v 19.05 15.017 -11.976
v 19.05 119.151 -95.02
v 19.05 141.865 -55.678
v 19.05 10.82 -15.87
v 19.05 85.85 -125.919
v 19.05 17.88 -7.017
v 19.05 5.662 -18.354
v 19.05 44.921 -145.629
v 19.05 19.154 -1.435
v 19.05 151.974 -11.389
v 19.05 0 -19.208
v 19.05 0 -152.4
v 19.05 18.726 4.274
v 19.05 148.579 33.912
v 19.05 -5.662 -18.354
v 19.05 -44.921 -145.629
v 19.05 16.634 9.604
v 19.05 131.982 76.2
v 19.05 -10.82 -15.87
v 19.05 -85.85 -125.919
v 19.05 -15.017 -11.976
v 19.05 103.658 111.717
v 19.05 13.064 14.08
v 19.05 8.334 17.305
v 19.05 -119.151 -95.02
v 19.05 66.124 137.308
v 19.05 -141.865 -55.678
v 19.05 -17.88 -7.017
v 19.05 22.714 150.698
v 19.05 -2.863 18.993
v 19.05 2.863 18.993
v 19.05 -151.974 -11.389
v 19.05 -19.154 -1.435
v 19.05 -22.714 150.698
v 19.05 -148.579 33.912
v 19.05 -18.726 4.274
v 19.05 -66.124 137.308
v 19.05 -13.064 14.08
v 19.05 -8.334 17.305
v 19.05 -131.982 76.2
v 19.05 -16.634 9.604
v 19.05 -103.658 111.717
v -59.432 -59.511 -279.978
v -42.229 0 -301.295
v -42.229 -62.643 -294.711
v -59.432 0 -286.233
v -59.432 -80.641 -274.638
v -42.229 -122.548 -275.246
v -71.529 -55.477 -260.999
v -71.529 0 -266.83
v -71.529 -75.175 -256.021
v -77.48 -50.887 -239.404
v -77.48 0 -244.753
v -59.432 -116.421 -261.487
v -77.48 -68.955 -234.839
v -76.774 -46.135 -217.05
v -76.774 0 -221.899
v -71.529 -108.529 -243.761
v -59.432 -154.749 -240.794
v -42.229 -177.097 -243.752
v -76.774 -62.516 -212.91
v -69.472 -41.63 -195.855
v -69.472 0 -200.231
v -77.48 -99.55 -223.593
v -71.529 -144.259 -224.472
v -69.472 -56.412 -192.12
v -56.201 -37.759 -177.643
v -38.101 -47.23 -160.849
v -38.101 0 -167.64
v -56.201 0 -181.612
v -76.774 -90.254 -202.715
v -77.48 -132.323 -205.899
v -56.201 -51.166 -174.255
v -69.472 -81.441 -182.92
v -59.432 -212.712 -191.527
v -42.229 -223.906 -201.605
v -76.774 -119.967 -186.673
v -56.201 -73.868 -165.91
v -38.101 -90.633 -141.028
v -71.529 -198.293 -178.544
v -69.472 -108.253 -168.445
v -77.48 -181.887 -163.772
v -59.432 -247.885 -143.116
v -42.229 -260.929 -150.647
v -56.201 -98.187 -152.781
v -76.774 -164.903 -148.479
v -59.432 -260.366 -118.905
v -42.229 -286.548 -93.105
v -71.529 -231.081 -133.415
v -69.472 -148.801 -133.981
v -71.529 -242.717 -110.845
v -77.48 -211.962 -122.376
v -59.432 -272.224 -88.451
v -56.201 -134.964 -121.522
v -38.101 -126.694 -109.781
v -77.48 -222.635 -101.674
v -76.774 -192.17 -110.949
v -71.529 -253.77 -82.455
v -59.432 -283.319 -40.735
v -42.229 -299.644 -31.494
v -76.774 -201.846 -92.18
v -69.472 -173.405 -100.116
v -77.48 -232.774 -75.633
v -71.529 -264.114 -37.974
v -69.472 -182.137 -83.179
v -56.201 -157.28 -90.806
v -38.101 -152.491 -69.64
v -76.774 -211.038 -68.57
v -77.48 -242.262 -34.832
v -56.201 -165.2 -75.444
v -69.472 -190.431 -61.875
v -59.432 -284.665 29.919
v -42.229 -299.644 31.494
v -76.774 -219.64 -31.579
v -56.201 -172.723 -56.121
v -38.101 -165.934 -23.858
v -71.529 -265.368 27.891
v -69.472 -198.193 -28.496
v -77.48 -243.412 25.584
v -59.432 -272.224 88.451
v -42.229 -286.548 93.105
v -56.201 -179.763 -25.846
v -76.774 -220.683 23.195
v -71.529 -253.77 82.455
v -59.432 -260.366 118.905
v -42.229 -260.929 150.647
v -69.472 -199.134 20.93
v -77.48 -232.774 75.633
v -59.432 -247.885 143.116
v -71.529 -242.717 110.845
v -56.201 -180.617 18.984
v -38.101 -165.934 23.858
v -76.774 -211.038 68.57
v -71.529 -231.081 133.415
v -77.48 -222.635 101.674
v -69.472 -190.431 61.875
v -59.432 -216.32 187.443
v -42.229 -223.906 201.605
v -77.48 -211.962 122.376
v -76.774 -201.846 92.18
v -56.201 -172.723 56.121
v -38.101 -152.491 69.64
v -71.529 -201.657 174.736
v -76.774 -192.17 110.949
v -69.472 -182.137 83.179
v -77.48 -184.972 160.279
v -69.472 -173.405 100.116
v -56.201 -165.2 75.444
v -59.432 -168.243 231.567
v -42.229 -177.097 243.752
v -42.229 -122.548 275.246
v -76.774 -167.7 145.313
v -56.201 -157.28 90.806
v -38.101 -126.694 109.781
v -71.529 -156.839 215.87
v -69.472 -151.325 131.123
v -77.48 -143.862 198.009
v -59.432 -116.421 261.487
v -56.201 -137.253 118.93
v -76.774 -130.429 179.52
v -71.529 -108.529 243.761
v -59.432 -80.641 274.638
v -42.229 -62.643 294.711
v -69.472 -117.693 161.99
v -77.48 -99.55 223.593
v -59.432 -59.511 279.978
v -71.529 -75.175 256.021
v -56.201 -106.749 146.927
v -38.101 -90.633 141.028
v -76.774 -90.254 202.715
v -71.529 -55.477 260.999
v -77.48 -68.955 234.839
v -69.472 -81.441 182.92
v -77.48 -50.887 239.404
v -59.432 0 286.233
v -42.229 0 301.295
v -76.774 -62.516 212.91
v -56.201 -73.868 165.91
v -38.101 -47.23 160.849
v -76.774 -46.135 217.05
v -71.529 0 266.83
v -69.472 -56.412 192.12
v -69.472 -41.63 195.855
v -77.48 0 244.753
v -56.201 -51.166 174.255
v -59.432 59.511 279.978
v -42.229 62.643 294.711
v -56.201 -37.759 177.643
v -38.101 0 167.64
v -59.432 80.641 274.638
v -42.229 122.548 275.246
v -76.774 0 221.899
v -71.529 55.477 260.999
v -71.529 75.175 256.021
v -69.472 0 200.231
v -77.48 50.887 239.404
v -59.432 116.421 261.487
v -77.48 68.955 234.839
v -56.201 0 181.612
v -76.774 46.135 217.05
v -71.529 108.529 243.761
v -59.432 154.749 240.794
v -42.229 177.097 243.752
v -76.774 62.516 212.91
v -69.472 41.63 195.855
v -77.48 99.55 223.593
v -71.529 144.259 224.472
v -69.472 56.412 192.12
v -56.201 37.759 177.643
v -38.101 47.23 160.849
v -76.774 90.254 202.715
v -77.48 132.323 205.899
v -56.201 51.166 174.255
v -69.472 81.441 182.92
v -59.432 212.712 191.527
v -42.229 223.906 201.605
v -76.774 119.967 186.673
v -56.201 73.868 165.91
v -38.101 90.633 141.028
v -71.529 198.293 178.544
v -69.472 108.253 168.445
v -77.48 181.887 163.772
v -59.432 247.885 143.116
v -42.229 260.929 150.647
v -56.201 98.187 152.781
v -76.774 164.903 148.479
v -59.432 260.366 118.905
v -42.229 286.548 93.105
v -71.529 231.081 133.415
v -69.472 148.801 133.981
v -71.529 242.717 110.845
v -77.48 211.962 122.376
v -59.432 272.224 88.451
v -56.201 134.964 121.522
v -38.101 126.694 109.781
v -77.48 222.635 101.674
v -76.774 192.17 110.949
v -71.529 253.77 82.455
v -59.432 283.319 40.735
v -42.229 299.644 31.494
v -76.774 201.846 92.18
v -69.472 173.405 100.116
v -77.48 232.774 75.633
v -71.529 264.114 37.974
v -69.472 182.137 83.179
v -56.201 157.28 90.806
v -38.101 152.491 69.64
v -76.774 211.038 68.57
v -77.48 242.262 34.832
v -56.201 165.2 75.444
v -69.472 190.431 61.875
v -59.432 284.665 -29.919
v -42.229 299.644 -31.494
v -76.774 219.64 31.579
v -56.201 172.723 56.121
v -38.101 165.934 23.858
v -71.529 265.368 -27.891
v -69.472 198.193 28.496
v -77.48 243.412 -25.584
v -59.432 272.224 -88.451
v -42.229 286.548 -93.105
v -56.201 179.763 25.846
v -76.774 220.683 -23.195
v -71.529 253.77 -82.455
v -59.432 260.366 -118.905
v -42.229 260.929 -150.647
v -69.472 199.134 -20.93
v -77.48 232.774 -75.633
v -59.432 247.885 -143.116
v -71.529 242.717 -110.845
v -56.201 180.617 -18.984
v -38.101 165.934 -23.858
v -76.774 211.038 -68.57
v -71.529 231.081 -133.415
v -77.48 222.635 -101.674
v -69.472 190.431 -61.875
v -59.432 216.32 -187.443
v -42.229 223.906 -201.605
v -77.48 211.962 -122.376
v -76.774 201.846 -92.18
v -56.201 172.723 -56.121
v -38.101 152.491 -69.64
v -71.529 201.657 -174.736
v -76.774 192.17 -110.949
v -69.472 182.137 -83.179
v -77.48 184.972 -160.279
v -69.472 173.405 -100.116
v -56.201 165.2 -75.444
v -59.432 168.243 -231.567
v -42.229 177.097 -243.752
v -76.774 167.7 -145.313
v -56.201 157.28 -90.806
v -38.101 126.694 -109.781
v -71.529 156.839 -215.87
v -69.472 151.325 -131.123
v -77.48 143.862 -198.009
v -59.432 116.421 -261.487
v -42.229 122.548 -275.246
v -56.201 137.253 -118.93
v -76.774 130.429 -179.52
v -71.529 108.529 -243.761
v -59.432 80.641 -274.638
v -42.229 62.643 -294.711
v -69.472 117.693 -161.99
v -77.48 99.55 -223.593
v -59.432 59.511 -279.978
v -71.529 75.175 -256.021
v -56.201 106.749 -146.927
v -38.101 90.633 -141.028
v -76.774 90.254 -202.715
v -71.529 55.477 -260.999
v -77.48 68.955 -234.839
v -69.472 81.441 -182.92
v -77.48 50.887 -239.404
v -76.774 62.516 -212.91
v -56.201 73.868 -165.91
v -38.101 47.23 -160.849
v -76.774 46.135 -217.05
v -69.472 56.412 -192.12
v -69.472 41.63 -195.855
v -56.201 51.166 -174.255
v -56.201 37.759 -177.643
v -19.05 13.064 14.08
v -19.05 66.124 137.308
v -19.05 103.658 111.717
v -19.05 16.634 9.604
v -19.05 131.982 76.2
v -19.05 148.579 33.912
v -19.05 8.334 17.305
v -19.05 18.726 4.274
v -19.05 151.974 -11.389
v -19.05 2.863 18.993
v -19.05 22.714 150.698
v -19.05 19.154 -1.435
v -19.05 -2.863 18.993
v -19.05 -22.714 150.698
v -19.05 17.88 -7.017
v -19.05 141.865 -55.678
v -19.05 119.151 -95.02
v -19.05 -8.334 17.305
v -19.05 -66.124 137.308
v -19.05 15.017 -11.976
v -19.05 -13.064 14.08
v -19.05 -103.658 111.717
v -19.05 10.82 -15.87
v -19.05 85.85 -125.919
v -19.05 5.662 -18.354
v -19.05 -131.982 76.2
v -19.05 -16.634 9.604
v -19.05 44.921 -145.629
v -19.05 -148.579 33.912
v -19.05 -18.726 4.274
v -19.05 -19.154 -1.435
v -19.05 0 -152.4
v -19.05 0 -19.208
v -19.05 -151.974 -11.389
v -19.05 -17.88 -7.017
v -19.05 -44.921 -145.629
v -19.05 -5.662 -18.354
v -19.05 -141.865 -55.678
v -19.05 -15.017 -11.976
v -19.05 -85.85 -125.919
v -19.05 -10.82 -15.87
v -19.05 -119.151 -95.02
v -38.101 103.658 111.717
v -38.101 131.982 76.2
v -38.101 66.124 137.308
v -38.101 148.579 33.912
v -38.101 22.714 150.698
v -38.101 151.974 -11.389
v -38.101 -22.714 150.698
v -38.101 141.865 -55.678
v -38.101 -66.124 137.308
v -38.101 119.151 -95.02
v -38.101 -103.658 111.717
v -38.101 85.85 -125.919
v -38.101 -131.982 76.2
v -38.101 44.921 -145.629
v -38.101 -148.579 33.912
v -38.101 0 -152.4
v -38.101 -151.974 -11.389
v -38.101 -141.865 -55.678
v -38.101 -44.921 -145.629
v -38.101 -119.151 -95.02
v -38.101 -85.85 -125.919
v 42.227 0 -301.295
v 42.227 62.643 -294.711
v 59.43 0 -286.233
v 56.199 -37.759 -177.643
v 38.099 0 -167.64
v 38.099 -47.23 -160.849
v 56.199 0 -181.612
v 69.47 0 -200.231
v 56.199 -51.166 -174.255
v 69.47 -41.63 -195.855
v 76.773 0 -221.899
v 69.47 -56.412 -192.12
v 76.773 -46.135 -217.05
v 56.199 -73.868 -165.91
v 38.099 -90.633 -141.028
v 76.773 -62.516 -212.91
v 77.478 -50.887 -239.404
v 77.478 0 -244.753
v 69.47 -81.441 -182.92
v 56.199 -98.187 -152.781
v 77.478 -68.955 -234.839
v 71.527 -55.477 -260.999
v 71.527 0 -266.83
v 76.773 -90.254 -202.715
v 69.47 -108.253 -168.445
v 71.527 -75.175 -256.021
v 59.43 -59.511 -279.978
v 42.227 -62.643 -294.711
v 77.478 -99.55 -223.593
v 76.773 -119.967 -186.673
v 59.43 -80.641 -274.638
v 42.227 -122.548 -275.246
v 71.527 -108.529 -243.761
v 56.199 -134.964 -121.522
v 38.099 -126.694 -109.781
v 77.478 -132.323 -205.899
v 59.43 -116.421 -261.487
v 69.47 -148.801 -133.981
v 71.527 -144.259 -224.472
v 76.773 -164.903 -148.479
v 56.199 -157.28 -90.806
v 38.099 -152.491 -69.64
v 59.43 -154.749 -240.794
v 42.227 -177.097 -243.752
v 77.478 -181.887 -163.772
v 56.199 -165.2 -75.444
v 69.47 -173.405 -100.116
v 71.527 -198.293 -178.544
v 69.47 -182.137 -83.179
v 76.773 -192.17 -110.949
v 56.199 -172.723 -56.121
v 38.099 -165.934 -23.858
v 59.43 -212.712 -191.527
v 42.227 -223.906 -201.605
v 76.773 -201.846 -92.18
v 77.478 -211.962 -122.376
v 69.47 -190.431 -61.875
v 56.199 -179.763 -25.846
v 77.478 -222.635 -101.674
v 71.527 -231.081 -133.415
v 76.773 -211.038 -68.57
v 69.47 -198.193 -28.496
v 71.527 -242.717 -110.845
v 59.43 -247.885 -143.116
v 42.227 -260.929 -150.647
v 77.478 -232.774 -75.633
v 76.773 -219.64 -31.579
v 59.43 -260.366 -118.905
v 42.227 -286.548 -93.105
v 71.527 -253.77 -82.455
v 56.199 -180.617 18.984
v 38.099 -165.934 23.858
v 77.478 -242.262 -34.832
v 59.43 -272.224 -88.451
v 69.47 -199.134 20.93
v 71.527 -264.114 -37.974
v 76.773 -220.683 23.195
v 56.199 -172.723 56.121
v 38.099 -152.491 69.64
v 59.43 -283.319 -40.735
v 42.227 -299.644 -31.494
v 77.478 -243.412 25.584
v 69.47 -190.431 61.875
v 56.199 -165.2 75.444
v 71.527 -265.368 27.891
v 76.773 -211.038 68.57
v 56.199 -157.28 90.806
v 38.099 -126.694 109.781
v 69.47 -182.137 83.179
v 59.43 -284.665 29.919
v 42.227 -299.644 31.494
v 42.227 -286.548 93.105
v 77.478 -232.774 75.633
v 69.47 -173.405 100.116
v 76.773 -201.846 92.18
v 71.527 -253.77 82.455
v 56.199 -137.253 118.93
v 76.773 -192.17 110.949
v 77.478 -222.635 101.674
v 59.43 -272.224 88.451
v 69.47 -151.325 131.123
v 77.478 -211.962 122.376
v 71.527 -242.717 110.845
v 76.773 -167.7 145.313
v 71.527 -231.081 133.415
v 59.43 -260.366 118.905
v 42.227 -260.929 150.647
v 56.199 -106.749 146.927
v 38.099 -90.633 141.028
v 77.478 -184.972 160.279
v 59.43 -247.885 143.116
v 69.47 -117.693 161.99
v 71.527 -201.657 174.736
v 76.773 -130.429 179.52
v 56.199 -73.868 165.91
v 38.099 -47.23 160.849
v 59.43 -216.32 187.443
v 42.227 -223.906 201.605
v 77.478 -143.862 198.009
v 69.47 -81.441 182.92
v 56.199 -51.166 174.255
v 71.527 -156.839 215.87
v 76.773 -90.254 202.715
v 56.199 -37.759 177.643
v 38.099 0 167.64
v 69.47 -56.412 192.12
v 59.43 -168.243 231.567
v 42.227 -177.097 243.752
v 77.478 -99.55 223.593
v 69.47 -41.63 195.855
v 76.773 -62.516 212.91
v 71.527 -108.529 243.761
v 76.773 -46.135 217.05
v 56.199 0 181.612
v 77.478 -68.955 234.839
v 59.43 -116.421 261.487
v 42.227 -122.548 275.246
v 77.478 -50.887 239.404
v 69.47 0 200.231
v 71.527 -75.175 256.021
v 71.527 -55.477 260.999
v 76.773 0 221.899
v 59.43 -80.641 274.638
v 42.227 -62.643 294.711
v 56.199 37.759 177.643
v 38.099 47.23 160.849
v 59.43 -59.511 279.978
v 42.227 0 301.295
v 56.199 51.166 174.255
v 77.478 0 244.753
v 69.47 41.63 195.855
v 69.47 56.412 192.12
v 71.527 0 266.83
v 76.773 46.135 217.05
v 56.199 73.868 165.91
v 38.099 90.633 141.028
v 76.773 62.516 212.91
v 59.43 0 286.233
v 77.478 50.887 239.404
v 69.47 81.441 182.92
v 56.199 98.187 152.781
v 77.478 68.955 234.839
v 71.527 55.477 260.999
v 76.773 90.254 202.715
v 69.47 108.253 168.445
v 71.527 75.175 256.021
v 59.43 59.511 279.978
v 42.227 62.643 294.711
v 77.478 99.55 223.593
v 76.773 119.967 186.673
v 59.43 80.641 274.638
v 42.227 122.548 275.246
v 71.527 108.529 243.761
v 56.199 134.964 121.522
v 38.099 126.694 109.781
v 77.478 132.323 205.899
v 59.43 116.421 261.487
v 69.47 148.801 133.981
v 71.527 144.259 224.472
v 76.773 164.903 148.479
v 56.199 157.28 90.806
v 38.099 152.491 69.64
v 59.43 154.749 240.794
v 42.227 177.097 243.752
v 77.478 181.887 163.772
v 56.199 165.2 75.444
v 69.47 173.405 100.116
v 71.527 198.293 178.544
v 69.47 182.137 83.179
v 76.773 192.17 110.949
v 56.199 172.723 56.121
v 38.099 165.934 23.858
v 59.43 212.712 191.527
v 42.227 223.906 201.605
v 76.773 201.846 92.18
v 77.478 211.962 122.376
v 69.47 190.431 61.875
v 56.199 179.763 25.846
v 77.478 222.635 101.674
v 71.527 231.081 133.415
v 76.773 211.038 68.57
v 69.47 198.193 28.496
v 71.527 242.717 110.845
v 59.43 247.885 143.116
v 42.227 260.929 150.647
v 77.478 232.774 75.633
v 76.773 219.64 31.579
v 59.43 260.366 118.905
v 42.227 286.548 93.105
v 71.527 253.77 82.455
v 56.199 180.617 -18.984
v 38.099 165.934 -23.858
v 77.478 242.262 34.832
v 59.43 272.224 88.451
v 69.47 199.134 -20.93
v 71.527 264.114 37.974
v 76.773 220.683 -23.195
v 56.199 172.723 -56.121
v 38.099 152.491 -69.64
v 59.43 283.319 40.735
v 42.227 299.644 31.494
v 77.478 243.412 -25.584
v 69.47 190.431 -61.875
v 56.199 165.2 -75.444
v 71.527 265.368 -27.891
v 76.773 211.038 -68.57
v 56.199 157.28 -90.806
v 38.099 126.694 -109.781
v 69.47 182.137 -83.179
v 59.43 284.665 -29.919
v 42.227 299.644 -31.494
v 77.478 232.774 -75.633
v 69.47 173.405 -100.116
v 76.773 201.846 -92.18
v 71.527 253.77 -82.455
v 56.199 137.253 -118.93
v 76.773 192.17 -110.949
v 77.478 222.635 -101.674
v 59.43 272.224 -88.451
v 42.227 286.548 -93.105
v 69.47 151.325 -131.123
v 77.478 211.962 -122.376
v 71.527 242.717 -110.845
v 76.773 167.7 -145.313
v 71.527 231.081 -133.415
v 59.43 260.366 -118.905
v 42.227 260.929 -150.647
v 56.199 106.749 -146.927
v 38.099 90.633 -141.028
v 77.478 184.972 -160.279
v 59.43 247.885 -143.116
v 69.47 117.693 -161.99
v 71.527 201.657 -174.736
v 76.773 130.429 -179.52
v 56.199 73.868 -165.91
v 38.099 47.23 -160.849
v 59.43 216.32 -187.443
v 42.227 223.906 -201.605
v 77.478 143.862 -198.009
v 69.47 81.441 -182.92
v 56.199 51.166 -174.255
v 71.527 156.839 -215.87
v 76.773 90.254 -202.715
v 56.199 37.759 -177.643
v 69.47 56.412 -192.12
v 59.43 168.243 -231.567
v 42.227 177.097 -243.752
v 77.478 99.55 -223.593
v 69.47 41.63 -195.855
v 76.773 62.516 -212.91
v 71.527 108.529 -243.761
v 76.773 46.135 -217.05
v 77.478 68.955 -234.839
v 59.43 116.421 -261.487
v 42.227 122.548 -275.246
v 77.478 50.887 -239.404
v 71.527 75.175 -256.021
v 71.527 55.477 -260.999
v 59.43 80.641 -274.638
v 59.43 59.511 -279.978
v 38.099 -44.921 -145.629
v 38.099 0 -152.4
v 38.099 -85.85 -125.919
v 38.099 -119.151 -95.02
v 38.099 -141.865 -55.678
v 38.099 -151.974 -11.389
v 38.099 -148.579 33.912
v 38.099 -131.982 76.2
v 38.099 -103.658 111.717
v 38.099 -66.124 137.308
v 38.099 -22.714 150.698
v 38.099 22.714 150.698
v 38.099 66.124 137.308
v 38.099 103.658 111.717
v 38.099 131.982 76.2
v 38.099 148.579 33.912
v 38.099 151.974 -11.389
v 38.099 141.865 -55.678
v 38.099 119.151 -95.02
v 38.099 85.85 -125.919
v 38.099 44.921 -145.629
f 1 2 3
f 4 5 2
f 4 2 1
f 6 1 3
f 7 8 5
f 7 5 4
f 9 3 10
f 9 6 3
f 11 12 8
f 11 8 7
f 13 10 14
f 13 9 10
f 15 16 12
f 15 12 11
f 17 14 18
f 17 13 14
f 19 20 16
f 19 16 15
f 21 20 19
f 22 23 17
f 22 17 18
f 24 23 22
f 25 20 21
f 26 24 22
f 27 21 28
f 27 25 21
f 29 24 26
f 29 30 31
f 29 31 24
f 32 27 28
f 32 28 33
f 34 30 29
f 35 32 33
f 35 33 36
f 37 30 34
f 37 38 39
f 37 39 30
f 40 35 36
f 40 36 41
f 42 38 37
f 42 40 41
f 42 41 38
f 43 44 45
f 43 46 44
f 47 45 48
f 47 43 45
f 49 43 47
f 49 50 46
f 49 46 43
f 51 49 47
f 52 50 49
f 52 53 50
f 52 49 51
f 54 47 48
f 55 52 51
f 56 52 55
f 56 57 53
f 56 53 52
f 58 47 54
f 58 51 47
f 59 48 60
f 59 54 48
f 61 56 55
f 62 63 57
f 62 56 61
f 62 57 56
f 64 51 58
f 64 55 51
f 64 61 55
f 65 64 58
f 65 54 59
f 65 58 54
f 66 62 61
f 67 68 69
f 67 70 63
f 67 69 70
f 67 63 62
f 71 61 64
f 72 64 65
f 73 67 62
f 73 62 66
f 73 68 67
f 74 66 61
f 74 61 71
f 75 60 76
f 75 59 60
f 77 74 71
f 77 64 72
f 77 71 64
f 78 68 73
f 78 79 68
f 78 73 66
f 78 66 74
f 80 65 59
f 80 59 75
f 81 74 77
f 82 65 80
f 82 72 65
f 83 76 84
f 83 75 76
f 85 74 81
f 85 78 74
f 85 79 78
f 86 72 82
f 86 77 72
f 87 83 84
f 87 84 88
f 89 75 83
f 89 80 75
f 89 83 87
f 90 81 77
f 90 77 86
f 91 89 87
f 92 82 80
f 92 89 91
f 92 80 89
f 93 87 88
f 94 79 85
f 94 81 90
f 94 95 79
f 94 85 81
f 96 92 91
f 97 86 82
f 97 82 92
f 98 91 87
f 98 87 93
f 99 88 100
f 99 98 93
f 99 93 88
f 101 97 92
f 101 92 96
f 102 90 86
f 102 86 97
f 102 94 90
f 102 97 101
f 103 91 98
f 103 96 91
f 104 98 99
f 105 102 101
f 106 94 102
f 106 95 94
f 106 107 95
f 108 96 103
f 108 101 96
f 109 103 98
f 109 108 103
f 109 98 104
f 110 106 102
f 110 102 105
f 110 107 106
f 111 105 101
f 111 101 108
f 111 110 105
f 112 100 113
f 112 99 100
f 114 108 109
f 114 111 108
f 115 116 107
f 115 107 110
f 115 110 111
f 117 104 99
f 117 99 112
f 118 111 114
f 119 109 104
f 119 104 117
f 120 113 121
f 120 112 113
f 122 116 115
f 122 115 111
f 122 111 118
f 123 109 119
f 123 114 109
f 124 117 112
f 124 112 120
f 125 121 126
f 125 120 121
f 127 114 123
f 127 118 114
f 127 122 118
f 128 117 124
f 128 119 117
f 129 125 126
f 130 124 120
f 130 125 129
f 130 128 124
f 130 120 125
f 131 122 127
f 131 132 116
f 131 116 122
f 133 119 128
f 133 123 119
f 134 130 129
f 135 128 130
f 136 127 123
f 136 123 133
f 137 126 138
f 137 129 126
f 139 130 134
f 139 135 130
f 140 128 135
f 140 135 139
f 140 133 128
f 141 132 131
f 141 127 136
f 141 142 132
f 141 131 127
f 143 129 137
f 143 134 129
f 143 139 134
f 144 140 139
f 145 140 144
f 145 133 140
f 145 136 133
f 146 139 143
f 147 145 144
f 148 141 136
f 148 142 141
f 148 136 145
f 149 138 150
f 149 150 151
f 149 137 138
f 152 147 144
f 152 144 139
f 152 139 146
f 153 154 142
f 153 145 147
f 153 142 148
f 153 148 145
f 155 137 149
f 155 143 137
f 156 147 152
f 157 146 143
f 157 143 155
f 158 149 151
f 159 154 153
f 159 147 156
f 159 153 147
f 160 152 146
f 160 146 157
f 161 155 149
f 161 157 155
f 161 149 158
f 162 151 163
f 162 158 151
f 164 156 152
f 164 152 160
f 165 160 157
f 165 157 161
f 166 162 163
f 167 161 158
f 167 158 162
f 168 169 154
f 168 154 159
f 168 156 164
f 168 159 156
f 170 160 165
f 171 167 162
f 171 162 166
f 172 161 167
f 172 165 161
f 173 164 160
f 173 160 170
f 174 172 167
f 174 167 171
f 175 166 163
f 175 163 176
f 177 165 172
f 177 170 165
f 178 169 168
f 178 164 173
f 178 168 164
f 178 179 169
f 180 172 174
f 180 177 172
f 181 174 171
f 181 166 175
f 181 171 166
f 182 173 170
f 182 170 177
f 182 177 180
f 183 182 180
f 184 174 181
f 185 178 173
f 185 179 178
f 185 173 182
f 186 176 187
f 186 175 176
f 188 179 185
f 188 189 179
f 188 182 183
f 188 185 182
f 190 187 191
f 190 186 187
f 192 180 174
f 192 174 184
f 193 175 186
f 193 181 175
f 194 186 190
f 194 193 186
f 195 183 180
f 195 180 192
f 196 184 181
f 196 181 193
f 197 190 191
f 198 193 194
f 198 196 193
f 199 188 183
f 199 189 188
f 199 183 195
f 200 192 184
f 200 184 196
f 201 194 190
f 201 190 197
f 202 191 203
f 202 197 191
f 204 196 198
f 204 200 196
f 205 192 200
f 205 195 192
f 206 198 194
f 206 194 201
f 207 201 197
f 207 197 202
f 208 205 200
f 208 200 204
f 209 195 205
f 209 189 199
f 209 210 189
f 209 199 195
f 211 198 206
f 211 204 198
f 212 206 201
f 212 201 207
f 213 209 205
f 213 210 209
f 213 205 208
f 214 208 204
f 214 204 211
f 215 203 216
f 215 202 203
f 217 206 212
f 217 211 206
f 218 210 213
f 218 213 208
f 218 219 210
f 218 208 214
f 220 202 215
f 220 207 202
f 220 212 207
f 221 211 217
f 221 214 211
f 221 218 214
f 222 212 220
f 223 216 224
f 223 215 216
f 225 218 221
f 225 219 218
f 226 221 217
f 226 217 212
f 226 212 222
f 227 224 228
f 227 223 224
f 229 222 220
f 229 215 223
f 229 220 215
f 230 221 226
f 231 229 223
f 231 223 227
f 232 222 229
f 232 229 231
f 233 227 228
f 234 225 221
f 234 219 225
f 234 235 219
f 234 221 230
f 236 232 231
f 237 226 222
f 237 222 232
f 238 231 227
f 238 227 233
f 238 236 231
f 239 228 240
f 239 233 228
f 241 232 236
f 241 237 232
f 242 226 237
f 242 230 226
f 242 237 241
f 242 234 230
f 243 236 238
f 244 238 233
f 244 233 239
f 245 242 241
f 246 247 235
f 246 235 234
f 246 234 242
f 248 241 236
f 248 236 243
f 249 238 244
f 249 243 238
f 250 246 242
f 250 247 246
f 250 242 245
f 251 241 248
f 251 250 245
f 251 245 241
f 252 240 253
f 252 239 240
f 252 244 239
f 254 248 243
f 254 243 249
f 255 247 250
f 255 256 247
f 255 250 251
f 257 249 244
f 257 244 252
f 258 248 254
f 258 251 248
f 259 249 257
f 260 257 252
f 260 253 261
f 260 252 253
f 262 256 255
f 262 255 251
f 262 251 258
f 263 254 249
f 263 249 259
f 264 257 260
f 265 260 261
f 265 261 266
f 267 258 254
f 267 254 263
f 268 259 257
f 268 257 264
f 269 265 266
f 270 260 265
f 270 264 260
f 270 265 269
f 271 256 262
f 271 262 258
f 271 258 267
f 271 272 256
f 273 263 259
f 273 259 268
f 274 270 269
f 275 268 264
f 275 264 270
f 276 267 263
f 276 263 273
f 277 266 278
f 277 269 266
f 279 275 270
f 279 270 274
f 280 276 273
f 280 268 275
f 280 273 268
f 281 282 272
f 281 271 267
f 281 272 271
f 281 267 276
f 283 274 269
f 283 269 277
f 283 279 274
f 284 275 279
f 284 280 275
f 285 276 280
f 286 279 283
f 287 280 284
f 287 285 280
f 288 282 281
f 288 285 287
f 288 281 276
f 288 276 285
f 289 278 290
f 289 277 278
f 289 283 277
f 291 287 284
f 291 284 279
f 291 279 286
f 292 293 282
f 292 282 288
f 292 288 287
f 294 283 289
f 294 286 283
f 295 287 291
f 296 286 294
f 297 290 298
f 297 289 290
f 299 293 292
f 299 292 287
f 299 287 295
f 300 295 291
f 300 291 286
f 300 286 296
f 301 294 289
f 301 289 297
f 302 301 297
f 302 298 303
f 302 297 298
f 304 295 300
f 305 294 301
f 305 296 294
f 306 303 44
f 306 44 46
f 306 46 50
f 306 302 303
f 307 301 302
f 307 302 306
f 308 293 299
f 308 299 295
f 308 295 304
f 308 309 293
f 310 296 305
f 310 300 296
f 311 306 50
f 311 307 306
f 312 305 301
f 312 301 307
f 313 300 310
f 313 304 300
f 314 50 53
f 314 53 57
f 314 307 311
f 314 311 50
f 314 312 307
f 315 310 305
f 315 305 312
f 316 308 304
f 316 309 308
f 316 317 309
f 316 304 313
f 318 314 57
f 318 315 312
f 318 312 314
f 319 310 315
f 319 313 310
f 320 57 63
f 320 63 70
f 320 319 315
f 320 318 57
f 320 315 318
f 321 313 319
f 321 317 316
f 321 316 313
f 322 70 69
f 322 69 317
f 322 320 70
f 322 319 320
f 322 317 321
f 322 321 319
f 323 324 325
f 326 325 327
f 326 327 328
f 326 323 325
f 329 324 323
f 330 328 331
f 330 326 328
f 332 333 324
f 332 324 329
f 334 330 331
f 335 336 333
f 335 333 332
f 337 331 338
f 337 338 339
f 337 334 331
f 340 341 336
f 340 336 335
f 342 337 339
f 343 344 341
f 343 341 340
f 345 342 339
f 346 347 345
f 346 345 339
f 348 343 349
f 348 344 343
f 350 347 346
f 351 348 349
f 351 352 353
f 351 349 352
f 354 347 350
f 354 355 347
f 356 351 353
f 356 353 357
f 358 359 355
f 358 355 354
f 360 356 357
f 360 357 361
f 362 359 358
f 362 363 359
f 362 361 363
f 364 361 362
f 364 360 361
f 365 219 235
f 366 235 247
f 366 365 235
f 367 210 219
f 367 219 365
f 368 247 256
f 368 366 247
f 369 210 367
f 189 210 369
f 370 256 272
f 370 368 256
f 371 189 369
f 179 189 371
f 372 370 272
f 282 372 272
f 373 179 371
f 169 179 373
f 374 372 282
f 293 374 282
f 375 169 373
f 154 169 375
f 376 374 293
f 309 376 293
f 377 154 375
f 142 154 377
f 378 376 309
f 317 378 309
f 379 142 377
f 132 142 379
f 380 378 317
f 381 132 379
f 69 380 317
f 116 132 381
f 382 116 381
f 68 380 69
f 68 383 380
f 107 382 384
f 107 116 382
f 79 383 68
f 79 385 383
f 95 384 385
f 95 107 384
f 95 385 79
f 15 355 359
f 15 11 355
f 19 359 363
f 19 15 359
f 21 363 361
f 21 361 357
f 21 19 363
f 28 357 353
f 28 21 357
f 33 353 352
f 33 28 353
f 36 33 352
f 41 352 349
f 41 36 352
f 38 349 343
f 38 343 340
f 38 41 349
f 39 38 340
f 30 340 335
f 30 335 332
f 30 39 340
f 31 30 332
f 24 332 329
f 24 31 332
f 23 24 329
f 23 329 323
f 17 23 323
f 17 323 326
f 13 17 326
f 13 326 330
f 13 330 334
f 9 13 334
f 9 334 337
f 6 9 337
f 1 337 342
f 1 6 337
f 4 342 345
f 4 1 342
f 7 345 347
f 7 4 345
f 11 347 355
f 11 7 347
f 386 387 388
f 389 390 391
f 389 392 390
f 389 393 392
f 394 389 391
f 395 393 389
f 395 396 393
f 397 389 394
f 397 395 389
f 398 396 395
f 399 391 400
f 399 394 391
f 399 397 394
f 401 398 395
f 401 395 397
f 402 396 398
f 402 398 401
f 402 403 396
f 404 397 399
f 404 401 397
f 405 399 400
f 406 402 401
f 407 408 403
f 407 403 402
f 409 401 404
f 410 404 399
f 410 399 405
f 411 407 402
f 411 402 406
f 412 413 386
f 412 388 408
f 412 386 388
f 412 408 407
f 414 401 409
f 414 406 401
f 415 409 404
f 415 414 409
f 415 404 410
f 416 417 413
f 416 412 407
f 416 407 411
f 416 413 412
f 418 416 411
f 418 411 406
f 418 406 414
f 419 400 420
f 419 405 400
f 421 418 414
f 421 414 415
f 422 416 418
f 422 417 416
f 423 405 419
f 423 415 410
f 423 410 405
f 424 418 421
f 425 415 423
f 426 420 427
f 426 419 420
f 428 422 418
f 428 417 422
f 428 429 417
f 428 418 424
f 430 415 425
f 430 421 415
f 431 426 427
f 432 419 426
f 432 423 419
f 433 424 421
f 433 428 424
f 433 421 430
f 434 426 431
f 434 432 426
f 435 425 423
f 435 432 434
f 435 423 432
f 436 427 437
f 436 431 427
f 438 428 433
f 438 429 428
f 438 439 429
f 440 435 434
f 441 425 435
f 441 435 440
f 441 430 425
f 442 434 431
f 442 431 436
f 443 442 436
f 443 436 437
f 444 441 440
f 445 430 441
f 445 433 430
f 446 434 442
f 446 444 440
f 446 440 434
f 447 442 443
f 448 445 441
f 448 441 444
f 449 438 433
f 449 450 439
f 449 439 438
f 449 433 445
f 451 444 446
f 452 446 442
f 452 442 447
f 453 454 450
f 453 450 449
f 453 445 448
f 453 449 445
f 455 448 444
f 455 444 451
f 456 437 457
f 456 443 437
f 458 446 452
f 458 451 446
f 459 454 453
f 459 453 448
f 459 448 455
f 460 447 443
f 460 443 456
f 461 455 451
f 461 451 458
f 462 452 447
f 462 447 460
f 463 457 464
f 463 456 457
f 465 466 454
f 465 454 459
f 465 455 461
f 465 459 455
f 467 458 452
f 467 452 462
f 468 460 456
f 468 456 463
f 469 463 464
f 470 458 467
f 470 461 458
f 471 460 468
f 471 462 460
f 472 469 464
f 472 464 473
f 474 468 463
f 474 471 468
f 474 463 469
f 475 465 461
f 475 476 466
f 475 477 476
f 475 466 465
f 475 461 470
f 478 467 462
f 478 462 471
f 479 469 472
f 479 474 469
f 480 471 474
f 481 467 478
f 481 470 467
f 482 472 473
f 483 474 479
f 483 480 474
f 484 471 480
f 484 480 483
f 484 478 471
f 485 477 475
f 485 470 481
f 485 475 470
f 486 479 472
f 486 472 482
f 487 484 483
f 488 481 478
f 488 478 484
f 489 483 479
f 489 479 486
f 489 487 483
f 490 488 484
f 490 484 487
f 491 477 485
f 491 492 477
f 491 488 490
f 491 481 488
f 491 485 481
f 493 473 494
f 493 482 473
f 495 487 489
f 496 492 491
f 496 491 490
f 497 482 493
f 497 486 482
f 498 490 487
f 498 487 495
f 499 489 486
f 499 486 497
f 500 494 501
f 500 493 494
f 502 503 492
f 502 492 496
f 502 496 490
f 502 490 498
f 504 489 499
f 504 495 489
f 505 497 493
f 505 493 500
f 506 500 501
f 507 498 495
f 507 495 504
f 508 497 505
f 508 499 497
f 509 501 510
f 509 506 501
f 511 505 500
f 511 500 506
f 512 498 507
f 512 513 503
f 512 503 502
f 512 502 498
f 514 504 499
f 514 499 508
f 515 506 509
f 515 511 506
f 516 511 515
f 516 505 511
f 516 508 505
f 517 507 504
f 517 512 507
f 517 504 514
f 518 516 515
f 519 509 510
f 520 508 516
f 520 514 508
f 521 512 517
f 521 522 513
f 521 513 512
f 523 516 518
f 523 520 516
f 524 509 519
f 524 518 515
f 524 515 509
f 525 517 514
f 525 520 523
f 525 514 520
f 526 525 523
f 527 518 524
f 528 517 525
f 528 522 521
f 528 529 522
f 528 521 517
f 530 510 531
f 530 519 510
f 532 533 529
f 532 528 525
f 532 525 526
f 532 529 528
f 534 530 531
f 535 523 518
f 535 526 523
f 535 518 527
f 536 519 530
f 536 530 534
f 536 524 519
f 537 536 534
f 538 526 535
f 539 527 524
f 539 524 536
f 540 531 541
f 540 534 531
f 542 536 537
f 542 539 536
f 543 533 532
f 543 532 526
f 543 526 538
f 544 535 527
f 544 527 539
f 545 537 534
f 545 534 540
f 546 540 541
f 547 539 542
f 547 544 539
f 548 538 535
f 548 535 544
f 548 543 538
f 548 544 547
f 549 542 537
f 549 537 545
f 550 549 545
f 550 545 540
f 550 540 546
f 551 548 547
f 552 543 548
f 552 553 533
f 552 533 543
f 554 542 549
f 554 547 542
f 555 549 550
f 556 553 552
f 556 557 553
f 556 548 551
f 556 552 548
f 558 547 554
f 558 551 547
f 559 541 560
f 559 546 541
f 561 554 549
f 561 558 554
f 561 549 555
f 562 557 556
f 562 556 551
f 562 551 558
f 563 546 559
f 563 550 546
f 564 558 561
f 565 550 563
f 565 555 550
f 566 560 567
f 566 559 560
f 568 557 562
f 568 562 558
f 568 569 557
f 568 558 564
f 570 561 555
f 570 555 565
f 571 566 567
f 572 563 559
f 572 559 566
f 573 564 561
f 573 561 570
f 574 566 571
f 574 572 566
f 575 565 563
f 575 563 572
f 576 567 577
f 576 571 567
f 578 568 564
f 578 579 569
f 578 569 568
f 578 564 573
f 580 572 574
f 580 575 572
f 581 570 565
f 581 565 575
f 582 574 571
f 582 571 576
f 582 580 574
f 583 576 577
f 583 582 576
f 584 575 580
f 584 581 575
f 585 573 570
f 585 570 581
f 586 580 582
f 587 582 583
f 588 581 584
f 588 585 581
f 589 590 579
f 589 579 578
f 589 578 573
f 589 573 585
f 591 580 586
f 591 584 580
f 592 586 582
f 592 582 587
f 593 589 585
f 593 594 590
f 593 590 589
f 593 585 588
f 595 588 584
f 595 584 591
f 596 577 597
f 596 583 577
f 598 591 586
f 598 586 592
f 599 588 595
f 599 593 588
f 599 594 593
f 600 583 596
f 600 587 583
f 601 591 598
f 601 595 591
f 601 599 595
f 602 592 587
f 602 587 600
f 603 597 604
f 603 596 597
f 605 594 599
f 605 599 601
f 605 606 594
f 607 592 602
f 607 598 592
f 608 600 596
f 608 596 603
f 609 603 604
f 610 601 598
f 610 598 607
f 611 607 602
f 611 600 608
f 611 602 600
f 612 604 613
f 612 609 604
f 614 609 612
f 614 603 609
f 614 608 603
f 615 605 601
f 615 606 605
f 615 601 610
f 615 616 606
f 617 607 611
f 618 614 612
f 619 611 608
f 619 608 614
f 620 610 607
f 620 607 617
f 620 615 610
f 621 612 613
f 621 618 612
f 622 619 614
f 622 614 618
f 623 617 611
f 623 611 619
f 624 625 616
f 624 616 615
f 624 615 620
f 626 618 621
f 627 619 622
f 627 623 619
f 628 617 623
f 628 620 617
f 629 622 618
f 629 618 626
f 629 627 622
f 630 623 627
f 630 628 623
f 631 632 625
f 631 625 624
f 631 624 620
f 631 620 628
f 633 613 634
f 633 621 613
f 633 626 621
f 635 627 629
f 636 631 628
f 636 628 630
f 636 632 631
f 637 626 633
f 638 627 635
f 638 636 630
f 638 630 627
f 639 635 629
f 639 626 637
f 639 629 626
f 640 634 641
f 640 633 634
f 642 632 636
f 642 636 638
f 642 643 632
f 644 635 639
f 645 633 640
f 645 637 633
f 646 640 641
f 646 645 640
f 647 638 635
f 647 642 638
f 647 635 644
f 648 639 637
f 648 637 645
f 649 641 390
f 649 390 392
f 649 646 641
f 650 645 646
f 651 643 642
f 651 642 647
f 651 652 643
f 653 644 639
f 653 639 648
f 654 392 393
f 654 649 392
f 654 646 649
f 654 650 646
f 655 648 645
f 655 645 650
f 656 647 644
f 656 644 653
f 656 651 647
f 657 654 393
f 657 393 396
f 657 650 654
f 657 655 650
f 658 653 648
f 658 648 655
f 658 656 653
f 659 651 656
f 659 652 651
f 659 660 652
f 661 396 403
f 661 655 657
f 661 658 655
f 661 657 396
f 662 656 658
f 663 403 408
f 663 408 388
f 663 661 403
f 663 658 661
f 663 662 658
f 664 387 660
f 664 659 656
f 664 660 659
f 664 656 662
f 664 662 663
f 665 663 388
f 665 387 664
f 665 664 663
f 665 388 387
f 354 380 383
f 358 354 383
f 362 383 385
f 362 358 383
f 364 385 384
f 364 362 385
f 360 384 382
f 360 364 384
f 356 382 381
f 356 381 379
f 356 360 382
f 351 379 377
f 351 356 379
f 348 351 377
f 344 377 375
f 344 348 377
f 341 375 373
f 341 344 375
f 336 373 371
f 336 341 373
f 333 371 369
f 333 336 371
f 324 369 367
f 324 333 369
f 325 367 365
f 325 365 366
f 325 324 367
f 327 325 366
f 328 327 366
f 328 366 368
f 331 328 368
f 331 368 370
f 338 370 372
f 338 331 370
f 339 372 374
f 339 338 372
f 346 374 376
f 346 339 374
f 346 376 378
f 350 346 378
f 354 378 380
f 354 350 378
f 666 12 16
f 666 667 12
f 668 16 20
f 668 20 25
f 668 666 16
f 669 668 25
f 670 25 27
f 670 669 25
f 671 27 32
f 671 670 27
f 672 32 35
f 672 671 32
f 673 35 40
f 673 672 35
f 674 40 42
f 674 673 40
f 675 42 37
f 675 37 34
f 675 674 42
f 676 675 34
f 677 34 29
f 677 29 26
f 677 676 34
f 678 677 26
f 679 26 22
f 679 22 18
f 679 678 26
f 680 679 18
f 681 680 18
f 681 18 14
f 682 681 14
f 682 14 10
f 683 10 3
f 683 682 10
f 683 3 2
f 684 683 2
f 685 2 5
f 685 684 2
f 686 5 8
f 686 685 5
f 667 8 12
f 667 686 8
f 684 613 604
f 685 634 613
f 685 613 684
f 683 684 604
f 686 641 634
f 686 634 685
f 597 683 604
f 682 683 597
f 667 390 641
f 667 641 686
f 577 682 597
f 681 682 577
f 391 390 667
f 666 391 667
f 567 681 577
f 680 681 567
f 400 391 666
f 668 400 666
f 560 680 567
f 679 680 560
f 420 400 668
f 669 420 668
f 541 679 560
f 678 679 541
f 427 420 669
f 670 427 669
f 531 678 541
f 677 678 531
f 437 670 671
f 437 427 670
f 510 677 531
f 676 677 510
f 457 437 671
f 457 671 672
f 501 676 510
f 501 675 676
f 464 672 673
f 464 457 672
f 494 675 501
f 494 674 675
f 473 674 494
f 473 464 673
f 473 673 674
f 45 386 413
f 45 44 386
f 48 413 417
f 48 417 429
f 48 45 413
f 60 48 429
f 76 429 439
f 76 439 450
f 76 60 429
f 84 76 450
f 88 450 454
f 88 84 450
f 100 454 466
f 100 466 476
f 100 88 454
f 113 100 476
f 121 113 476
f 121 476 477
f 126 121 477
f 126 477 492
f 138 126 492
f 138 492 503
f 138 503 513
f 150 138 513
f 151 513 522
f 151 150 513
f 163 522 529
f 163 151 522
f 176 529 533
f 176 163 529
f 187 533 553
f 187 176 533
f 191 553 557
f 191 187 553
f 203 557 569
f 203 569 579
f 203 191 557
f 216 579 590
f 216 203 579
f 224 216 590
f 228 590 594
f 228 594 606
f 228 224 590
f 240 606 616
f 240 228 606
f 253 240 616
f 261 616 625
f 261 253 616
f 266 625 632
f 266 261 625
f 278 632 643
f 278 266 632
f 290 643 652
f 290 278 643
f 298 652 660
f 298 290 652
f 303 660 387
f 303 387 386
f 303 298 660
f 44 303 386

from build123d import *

# Parameters (mm, degrees)
SCALE1_SCALE = 1.5


with BuildPart() as part:
    # Sketch1 → Revolve1 (revolve)
    with BuildSketch(Plane.XY, mode=Mode.PRIVATE) as revolve1_sk:
        with BuildLine():
            Line((12.7, 12.80502263), (12.7, 101.6))
            Line((12.7, 101.6), (25.399381994, 101.6))
            Line((25.399381994, 101.6), (25.399381994, 111.76))
            ThreePointArc((25.399381994, 111.76), (51.978144098, 155.533163358), (28.151294552, 200.863083566))
            Line((28.151294552, 200.863083566), (-0.000618006, 200.863083566))
            Line((-0.000618006, 200.863083566), (-28.152530564, 200.863083566))
            ThreePointArc((-28.152530564, 200.863083566), (-51.97938011, 155.533163358), (-25.400618006, 111.76))
            Line((-25.400618006, 111.76), (-25.400618006, 101.6))
            Line((-25.400618006, 101.6), (-12.7, 101.6))
            Line((-12.7, 101.6), (-12.7, 12.80502263))
            Line((-12.7, 12.80502263), (12.7, 12.80502263))
        make_face()
    revolve(revolve1_sk.sketch.rotate(Axis((12.7, 0, 0), (-1, 0, 0)), 90), axis=Axis((12.7, 0, 0), (-1, 0, 0)))


with BuildPart() as part_1:
    # Scale1: scaled about (-0.000562241, 0, 0)
    add(part.part.scale(SCALE1_SCALE).moved(Location((0.00028112, 0, 0))))


solid = part_1.part
